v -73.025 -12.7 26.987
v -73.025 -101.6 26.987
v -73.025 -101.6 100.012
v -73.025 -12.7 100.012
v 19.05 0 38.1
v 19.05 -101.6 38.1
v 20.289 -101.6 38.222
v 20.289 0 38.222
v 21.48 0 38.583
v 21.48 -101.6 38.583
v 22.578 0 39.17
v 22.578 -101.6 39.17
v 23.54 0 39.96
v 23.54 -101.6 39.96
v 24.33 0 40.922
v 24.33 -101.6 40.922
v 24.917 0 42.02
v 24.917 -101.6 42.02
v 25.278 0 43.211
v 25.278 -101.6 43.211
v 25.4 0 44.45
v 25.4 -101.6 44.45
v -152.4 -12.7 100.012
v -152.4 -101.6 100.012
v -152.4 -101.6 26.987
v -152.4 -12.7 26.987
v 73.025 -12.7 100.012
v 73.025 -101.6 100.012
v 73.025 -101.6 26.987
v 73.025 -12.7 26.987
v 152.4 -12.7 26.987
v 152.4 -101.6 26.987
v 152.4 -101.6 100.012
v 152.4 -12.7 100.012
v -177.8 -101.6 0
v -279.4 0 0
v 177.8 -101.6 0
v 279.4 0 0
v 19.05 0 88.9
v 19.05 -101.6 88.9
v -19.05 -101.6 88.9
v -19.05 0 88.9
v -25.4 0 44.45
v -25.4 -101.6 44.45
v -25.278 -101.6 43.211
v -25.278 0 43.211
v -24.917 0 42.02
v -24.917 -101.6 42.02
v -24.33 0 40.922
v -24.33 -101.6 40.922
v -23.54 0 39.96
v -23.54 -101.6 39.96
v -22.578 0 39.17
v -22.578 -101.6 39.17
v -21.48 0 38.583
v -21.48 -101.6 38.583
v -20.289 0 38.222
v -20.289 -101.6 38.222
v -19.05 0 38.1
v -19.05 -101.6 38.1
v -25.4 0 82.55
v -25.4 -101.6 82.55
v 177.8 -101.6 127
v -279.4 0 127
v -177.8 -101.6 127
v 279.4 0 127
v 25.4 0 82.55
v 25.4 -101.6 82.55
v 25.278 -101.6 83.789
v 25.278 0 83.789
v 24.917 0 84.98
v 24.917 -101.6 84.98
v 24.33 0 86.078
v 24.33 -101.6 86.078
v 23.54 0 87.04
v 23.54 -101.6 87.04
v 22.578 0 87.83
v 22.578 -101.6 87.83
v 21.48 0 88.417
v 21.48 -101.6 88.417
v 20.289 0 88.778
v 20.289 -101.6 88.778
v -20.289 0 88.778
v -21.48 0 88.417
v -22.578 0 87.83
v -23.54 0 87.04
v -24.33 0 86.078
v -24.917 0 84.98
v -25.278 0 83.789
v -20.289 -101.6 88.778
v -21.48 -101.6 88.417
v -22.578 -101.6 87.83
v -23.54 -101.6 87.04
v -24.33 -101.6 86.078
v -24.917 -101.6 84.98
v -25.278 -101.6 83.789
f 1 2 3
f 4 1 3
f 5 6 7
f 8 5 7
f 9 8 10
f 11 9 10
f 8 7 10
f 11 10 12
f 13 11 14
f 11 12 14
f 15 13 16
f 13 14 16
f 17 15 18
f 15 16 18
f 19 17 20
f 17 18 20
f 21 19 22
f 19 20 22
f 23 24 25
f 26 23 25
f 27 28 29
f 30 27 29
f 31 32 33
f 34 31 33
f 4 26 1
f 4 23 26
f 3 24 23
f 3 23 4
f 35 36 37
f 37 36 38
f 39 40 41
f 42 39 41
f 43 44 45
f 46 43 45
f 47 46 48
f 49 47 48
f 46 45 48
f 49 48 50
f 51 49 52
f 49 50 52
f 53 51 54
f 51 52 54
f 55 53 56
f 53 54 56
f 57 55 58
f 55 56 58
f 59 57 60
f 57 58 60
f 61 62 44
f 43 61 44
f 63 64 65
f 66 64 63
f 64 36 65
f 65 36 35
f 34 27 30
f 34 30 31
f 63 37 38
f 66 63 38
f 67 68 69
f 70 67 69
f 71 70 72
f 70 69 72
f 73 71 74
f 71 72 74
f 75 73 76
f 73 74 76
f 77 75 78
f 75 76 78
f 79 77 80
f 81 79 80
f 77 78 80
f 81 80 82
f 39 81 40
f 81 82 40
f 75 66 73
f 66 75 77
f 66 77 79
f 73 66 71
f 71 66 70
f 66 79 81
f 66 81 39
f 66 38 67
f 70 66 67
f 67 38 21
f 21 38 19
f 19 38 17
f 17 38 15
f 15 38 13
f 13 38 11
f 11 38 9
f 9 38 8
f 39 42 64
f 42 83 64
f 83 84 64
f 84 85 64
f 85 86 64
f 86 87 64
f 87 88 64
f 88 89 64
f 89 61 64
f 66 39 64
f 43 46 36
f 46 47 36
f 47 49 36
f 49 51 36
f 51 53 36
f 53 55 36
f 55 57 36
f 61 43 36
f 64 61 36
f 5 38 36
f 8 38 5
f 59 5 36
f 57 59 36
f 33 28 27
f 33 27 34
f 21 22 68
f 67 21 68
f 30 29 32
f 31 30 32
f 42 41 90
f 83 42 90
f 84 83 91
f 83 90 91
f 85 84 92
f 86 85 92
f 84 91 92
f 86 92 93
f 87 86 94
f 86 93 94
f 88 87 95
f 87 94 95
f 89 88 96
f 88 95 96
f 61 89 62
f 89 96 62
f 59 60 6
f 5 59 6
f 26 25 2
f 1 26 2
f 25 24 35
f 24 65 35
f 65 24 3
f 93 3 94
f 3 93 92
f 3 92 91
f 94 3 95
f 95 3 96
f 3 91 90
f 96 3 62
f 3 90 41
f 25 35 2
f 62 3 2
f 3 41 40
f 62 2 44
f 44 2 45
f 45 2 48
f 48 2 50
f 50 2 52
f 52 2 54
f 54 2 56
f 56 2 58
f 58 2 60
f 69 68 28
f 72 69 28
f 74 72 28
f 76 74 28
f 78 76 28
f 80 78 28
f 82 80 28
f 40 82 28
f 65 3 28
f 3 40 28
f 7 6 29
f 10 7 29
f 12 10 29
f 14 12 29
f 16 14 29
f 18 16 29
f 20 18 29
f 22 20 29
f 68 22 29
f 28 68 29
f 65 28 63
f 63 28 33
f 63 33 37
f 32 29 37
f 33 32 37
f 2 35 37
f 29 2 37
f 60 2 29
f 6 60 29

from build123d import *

# Parameters (mm, degrees)
F1_DEPTH = 127
F3_DEPTH = 101.601
F4_W     = 79.375
F4_H     = 36.5125
F5_DEPTH = 88.9


# Not quite as in the source:
# - a feature names something its author has since deleted; it is built from what else it names


with BuildPart() as f1:
    # F0 (on Top) → F1 (new body)
    with BuildSketch(Plane.XY):
        Polygon((177.8, 0), (-177.8, 0), (-279.4, 0), (-177.8, -101.6), (177.8, -101.6), (279.4, 0), align=None)
    extrude(amount=F1_DEPTH)

    # F2 (on face) → F3 (cut, through all)
    with BuildSketch(Plane.XZ.offset(101.6)):
        with BuildLine():
            Line((19.05, 88.9), (-19.05, 88.9))
            ThreePointArc((-19.05, 88.9), (-23.5401280605, 87.0401280605), (-25.4, 82.55))
            Line((-25.4, 82.55), (-25.4, 44.45))
            ThreePointArc((-25.4, 44.45), (-23.5401280605, 39.9598719395), (-19.05, 38.1))
            Line((-19.05, 38.1), (19.05, 38.1))
            ThreePointArc((19.05, 38.1), (23.5401280605, 39.9598719395), (25.4, 44.45))
            Line((25.4, 44.45), (25.4, 82.55))
            ThreePointArc((25.4, 82.55), (23.5401280605, 87.0401280605), (19.05, 88.9))
        make_face()
    extrude(amount=-F3_DEPTH, mode=Mode.SUBTRACT)

    # F4 (on face) → F5 (cut)
    with BuildSketch(Plane.XZ.offset(101.6)):
        with Locations((-112.7125, 45.24375)):
            Rectangle(F4_W, F4_H)
        with Locations((-112.7125, 81.75625)):
            Rectangle(F4_W, F4_H)
        with Locations((112.7125, 81.75625)):
            Rectangle(F4_W, F4_H)
        with Locations((112.7125, 45.24375)):
            Rectangle(F4_W, F4_H)
    extrude(amount=-F5_DEPTH, mode=Mode.SUBTRACT)


solid = f1.part
